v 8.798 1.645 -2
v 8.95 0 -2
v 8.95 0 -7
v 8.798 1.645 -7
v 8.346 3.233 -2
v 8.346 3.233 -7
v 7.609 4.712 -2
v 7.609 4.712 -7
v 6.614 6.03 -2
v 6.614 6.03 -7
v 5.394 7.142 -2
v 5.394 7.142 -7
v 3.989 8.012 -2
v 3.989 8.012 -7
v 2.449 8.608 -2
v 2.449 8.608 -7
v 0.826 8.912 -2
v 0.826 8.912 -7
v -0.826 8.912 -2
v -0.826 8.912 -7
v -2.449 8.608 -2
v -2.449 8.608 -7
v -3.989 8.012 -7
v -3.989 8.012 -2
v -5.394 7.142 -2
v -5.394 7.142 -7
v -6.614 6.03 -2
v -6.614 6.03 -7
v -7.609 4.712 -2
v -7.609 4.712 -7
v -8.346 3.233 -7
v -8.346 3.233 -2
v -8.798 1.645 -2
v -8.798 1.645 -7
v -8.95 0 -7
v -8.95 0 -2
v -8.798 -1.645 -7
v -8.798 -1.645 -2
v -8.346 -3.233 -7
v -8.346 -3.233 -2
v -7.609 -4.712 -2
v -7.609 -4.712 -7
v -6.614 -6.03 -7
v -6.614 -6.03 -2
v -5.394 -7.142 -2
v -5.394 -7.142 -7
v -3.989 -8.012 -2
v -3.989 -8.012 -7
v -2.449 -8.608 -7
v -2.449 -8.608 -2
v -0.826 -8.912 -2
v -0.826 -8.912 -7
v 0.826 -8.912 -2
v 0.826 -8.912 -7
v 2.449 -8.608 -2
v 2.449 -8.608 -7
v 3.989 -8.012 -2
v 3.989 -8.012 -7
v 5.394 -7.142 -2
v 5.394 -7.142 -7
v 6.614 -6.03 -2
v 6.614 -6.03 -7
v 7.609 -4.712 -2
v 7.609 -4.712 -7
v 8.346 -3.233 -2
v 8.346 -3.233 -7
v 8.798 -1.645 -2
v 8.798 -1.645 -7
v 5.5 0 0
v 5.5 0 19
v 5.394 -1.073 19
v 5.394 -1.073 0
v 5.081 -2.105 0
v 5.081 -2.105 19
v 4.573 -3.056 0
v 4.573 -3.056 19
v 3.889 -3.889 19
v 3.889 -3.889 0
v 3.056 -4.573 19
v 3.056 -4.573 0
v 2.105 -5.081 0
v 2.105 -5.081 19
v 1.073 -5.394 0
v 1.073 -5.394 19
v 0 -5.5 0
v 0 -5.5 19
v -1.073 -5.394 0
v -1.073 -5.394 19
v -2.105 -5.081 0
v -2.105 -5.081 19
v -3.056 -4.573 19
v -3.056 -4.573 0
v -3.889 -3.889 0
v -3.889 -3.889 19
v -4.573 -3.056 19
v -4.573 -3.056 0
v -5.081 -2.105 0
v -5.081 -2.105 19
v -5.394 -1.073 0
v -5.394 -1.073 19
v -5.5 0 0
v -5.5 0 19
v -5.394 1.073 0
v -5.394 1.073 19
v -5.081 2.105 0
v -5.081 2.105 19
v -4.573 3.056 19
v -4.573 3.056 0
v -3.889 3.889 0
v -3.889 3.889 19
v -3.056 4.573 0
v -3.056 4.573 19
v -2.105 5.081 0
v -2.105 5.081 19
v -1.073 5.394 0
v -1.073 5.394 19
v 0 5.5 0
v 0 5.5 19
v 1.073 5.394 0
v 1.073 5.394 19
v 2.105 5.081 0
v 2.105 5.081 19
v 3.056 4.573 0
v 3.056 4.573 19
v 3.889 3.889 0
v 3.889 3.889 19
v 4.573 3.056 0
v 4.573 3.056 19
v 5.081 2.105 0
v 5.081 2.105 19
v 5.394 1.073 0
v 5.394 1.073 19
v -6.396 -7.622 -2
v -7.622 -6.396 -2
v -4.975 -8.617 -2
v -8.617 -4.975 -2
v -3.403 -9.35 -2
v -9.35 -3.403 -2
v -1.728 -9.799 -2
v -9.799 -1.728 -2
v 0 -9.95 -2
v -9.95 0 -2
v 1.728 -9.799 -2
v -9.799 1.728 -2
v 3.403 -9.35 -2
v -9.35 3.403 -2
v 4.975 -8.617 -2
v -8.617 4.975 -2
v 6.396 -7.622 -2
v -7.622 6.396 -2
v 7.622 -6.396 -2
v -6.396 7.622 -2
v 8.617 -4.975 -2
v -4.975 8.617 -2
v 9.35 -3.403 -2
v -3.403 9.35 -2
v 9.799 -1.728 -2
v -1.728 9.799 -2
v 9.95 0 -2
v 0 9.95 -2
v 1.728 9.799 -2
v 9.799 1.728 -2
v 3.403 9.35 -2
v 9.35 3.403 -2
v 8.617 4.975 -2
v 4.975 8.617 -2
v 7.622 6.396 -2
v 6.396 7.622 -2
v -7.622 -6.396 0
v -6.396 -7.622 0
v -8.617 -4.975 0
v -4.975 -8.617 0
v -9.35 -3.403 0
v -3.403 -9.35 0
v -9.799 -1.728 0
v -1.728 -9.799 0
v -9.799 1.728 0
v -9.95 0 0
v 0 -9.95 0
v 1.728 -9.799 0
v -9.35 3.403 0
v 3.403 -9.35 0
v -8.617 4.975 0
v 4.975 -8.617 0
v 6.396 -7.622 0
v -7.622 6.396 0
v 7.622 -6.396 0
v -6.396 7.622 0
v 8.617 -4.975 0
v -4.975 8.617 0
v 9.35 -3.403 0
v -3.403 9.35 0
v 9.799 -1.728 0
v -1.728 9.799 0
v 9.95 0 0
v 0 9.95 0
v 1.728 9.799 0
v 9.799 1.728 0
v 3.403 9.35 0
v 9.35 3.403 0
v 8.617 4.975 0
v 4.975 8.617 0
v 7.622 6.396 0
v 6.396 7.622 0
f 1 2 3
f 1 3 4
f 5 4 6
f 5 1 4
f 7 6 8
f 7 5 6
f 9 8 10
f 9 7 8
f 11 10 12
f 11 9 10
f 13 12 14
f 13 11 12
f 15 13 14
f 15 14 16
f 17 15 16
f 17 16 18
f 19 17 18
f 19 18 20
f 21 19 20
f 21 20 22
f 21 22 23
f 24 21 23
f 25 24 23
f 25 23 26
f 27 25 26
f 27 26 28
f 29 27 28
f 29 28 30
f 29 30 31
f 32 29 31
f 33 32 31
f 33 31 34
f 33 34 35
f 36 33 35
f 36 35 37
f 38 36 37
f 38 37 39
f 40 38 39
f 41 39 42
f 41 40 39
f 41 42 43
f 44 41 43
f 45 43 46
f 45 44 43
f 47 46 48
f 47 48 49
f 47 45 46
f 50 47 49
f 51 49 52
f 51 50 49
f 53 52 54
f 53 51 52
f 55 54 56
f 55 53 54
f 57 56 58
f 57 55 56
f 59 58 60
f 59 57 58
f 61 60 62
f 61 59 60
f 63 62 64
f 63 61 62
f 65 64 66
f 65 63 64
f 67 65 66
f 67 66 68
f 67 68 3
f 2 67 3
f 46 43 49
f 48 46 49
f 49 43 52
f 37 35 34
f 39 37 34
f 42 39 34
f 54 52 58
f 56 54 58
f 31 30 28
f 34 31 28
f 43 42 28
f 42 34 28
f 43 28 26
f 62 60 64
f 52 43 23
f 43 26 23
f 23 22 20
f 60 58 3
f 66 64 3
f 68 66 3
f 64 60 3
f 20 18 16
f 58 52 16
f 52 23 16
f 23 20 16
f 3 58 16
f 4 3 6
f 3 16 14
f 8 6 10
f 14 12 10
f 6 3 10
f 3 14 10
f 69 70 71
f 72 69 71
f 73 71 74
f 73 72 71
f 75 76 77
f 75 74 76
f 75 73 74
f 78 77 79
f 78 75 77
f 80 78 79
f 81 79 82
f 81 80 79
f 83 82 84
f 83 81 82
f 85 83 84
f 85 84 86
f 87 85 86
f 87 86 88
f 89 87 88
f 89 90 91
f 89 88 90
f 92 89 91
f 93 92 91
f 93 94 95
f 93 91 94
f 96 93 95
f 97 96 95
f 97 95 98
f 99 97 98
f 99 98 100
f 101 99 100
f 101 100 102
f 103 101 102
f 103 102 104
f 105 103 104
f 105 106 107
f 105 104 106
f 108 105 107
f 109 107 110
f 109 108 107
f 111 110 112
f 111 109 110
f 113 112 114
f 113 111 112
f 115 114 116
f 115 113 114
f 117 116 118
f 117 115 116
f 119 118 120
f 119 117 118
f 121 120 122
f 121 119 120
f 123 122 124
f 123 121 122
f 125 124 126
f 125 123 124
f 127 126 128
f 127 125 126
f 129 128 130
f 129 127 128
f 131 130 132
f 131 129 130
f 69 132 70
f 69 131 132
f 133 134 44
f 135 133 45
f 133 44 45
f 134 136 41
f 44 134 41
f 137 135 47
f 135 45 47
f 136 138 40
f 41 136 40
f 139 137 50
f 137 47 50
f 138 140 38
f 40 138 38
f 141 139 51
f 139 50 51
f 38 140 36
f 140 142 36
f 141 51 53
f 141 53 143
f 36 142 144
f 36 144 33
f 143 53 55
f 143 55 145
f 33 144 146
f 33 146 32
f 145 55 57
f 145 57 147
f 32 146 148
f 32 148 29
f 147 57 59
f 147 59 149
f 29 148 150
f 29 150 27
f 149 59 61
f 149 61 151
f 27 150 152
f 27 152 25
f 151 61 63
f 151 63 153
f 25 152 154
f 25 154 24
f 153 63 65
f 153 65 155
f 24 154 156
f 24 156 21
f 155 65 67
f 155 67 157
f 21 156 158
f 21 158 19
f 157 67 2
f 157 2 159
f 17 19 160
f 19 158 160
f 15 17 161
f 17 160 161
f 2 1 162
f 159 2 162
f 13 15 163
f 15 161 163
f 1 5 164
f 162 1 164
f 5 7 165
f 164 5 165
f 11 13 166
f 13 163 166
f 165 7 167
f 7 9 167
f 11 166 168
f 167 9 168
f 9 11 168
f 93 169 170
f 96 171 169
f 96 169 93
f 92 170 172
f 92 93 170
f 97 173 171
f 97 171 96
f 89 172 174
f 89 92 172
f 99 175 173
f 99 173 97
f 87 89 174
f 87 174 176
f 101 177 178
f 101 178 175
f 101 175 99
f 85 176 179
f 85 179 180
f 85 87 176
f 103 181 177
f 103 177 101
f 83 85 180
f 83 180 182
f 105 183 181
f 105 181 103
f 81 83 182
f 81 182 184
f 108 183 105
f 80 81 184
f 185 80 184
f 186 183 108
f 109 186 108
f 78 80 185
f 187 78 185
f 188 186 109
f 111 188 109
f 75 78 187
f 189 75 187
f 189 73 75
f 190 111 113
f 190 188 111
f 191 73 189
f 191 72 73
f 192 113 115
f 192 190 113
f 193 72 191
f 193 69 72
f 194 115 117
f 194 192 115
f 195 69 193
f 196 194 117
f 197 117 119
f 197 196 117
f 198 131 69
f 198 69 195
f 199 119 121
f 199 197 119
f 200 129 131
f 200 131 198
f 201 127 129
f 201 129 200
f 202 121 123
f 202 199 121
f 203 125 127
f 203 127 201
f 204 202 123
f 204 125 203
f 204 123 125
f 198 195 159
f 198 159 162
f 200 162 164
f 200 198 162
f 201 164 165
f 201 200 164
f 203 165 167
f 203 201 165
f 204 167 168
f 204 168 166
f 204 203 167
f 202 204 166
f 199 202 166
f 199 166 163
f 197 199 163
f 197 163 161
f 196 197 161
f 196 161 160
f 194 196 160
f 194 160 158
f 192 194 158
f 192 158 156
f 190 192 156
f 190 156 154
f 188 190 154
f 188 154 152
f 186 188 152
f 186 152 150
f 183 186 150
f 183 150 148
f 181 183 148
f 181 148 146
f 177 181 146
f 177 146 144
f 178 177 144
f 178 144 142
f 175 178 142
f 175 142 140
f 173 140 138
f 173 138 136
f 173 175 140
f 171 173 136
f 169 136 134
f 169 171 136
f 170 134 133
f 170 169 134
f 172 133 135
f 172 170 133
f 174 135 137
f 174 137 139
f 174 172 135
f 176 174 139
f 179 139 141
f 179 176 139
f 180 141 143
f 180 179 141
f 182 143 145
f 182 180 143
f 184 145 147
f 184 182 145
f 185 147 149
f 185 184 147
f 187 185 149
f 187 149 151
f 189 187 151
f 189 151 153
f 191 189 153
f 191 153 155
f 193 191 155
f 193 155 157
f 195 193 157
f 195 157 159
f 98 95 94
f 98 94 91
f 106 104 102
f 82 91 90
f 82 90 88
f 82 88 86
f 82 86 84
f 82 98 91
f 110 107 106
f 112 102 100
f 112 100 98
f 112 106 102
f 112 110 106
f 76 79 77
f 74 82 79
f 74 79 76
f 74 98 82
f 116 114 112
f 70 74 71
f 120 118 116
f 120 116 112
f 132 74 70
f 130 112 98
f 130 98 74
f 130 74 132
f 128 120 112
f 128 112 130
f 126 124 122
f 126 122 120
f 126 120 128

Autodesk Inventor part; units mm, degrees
ref_plane "YZ Plane" through (0, 0, 0) normal (1, 0, 0) x (0, 1, 0)
ref_plane "XZ Plane" through (0, 0, 0) normal (0, 1, 0) x (-1, 0, 0)
ref_plane "XY Plane" through (0, 0, 0) normal (0, 0, 1) x (1, 0, 0)
sketch "Эскиз1" plane through (0, 0, 0) normal (0, 0, 1) x (1, 0, 0)
  circle A0 centre (0, 0) radius 8.95
  circle A1 centre (0, 0) radius 9.95
  circle A2 centre (0, 0) radius 5.5
  dimension "d0" = 17.9
  dimension "d1" = 19.9
  dimension "d2" = 11
extrude "Выдавливание1" add sketch "Эскиз1" along normal blind 19 contours A2
extrude "Выдавливание2" add sketch "Эскиз1" against normal blind 2 contours A0 | A1 | A2
extrude "Выдавливание3" add sketch "Эскиз1" against normal blind 7 contours A0 | A2
properties part number "деталь ек"
